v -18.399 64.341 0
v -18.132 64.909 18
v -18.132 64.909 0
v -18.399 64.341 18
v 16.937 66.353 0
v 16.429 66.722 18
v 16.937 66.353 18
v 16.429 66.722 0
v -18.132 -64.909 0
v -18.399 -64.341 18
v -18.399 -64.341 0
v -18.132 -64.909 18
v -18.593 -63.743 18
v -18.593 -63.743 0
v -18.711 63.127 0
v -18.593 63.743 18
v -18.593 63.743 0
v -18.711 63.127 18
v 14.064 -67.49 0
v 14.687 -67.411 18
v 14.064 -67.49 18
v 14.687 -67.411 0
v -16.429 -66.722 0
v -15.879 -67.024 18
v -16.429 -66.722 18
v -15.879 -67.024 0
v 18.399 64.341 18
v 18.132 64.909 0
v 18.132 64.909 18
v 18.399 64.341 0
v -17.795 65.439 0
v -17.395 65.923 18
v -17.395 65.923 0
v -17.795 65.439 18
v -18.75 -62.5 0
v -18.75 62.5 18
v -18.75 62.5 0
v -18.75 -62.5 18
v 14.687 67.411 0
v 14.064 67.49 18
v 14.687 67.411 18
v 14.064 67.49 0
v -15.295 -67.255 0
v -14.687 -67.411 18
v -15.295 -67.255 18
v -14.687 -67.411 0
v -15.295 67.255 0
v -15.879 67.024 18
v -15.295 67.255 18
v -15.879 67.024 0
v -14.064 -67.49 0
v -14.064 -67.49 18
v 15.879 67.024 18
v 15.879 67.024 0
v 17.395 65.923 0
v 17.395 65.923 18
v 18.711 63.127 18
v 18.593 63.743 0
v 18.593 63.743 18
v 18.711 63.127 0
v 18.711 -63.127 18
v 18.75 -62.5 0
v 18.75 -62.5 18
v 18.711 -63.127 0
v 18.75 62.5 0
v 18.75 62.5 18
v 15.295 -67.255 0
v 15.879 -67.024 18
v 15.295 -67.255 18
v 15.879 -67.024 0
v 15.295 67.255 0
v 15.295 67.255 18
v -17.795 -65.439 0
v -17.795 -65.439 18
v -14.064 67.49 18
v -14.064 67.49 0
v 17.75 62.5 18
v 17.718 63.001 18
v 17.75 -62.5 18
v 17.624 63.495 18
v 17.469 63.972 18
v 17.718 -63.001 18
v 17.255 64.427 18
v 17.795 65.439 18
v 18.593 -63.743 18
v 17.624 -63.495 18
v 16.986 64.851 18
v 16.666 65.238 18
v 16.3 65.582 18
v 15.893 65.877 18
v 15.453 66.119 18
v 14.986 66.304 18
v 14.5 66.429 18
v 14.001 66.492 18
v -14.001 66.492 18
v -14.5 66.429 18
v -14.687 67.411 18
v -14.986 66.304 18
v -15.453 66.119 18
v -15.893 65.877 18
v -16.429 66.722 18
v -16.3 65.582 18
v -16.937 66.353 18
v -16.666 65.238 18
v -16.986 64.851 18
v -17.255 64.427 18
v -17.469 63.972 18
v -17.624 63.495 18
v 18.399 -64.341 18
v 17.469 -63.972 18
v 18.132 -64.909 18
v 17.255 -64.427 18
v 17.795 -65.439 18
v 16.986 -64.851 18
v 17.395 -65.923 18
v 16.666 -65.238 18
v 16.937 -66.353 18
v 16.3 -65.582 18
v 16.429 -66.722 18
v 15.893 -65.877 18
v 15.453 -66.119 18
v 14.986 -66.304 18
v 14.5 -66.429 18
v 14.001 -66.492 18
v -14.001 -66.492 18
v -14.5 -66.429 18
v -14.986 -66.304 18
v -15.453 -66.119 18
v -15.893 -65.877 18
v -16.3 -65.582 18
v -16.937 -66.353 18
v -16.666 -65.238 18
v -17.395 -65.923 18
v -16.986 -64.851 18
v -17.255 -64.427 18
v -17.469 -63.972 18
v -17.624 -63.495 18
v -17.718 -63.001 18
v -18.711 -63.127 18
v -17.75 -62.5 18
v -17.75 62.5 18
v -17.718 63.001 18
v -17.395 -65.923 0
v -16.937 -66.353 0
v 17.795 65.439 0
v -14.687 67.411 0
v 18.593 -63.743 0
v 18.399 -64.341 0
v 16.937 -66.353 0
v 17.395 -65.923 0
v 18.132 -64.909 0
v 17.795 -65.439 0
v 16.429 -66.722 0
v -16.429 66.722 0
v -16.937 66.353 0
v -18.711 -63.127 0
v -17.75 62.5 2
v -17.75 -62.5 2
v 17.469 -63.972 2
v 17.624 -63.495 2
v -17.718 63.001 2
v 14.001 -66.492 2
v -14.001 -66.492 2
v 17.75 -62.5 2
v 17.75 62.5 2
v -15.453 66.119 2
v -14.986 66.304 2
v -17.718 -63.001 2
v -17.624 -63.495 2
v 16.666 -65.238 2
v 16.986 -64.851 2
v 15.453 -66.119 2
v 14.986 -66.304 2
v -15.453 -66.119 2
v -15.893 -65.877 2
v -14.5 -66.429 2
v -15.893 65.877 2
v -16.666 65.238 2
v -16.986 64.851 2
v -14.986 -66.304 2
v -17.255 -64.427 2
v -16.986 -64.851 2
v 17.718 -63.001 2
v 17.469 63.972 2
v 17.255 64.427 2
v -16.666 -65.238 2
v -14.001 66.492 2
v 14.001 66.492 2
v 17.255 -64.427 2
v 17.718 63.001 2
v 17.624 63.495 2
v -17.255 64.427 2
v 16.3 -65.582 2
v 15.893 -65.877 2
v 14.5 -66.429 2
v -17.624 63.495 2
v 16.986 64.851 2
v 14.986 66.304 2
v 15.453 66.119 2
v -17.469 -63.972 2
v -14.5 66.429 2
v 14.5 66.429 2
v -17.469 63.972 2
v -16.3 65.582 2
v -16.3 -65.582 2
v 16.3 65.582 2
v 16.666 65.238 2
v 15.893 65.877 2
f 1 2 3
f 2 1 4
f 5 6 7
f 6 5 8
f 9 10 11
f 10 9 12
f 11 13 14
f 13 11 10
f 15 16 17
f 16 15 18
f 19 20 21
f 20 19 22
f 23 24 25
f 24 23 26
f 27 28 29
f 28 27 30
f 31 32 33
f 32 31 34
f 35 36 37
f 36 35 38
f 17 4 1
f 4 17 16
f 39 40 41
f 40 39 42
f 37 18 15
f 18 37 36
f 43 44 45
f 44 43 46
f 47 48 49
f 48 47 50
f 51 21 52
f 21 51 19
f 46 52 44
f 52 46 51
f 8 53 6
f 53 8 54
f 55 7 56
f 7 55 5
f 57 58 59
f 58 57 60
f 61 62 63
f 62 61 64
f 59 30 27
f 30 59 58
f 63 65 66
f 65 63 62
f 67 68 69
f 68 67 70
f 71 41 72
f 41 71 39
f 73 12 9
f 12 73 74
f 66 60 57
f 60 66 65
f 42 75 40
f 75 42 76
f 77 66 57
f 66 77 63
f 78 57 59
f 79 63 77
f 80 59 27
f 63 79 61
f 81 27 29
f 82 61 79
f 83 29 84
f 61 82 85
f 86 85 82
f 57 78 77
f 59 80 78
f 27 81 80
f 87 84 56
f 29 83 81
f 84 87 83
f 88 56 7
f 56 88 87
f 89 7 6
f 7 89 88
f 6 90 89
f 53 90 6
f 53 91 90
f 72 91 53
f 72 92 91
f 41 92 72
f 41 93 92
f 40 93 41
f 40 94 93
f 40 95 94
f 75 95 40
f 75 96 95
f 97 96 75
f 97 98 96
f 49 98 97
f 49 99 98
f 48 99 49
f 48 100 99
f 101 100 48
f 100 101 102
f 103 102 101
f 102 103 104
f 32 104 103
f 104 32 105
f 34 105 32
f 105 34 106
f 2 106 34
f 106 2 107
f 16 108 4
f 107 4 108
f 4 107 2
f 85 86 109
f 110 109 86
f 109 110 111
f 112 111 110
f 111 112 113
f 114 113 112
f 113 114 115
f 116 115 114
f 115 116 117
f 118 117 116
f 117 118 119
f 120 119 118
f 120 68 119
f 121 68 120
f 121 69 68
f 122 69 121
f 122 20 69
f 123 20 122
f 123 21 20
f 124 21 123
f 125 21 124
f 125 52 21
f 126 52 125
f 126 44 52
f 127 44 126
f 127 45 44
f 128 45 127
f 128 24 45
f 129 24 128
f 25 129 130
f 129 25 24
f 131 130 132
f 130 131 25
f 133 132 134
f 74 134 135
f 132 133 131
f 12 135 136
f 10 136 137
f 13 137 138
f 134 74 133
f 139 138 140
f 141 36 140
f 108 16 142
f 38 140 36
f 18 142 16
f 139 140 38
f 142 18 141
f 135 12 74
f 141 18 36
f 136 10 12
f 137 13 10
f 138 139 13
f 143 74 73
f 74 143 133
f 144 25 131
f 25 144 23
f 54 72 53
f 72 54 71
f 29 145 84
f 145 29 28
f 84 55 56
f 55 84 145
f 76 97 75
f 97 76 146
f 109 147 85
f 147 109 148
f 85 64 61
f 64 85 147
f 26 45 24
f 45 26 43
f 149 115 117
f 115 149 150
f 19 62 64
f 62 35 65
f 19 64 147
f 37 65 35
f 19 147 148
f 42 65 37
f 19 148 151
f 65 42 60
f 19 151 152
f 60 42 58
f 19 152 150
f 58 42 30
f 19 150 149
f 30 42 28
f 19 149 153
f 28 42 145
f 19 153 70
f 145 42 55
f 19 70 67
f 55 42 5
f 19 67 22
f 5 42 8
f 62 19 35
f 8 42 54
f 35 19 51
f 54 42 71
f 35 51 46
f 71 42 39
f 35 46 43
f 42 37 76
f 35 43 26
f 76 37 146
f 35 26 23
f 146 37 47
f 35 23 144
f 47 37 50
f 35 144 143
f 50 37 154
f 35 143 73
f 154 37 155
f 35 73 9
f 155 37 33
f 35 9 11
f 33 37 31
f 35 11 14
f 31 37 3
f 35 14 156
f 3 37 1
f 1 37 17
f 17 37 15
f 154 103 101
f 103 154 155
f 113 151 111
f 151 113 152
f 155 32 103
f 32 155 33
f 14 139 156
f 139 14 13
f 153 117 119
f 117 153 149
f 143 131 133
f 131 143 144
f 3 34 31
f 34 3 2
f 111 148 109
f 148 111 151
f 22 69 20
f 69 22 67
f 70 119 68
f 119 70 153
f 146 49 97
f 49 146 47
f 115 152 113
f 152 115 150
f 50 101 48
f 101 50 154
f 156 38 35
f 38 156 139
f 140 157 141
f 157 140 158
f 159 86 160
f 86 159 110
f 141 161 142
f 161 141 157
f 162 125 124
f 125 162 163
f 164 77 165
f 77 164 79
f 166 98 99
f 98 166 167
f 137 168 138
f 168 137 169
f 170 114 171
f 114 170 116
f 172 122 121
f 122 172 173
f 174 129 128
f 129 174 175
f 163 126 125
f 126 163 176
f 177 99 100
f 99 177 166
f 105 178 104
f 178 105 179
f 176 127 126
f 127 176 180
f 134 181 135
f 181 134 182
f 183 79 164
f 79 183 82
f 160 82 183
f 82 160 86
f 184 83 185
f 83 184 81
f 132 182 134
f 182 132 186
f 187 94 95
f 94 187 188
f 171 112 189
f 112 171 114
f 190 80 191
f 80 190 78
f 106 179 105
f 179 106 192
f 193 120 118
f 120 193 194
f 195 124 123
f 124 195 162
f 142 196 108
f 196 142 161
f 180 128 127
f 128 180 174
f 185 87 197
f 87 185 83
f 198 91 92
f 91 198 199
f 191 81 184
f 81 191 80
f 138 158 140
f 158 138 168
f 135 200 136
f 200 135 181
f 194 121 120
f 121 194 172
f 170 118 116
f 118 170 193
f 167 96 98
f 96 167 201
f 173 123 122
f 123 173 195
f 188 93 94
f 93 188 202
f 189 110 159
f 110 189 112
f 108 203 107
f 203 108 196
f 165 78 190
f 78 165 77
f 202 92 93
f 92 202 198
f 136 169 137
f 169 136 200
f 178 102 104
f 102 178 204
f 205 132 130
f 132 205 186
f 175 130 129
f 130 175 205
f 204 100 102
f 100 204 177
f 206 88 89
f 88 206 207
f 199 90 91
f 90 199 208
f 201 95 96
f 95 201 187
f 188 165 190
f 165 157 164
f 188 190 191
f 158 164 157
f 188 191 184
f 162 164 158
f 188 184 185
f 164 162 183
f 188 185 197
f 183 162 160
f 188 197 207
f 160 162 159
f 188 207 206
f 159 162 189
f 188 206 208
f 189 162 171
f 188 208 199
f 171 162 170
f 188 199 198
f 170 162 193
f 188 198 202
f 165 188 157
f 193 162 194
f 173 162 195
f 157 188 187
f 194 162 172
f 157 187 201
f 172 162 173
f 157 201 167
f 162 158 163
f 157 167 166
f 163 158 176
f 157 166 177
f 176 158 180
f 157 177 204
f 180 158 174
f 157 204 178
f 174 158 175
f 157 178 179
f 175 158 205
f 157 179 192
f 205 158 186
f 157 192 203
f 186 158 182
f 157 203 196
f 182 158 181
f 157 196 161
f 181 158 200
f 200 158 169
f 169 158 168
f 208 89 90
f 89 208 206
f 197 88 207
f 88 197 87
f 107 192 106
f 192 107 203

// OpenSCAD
$fn = 50;


difference() {
	union() {
		hull() {
			translate(v = [-13.7500000000, 62.5000000000, 0]) {
				cylinder(h = 18, r = 5);
			}
			translate(v = [13.7500000000, 62.5000000000, 0]) {
				cylinder(h = 18, r = 5);
			}
			translate(v = [-13.7500000000, -62.5000000000, 0]) {
				cylinder(h = 18, r = 5);
			}
			translate(v = [13.7500000000, -62.5000000000, 0]) {
				cylinder(h = 18, r = 5);
			}
		}
	}
	union() {
		translate(v = [0, 0, 2]) {
			hull() {
				translate(v = [-13.7500000000, 62.5000000000, 0]) {
					cylinder(h = 16, r = 4);
				}
				translate(v = [13.7500000000, 62.5000000000, 0]) {
					cylinder(h = 16, r = 4);
				}
				translate(v = [-13.7500000000, -62.5000000000, 0]) {
					cylinder(h = 16, r = 4);
				}
				translate(v = [13.7500000000, -62.5000000000, 0]) {
					cylinder(h = 16, r = 4);
				}
			}
		}
	}
}
